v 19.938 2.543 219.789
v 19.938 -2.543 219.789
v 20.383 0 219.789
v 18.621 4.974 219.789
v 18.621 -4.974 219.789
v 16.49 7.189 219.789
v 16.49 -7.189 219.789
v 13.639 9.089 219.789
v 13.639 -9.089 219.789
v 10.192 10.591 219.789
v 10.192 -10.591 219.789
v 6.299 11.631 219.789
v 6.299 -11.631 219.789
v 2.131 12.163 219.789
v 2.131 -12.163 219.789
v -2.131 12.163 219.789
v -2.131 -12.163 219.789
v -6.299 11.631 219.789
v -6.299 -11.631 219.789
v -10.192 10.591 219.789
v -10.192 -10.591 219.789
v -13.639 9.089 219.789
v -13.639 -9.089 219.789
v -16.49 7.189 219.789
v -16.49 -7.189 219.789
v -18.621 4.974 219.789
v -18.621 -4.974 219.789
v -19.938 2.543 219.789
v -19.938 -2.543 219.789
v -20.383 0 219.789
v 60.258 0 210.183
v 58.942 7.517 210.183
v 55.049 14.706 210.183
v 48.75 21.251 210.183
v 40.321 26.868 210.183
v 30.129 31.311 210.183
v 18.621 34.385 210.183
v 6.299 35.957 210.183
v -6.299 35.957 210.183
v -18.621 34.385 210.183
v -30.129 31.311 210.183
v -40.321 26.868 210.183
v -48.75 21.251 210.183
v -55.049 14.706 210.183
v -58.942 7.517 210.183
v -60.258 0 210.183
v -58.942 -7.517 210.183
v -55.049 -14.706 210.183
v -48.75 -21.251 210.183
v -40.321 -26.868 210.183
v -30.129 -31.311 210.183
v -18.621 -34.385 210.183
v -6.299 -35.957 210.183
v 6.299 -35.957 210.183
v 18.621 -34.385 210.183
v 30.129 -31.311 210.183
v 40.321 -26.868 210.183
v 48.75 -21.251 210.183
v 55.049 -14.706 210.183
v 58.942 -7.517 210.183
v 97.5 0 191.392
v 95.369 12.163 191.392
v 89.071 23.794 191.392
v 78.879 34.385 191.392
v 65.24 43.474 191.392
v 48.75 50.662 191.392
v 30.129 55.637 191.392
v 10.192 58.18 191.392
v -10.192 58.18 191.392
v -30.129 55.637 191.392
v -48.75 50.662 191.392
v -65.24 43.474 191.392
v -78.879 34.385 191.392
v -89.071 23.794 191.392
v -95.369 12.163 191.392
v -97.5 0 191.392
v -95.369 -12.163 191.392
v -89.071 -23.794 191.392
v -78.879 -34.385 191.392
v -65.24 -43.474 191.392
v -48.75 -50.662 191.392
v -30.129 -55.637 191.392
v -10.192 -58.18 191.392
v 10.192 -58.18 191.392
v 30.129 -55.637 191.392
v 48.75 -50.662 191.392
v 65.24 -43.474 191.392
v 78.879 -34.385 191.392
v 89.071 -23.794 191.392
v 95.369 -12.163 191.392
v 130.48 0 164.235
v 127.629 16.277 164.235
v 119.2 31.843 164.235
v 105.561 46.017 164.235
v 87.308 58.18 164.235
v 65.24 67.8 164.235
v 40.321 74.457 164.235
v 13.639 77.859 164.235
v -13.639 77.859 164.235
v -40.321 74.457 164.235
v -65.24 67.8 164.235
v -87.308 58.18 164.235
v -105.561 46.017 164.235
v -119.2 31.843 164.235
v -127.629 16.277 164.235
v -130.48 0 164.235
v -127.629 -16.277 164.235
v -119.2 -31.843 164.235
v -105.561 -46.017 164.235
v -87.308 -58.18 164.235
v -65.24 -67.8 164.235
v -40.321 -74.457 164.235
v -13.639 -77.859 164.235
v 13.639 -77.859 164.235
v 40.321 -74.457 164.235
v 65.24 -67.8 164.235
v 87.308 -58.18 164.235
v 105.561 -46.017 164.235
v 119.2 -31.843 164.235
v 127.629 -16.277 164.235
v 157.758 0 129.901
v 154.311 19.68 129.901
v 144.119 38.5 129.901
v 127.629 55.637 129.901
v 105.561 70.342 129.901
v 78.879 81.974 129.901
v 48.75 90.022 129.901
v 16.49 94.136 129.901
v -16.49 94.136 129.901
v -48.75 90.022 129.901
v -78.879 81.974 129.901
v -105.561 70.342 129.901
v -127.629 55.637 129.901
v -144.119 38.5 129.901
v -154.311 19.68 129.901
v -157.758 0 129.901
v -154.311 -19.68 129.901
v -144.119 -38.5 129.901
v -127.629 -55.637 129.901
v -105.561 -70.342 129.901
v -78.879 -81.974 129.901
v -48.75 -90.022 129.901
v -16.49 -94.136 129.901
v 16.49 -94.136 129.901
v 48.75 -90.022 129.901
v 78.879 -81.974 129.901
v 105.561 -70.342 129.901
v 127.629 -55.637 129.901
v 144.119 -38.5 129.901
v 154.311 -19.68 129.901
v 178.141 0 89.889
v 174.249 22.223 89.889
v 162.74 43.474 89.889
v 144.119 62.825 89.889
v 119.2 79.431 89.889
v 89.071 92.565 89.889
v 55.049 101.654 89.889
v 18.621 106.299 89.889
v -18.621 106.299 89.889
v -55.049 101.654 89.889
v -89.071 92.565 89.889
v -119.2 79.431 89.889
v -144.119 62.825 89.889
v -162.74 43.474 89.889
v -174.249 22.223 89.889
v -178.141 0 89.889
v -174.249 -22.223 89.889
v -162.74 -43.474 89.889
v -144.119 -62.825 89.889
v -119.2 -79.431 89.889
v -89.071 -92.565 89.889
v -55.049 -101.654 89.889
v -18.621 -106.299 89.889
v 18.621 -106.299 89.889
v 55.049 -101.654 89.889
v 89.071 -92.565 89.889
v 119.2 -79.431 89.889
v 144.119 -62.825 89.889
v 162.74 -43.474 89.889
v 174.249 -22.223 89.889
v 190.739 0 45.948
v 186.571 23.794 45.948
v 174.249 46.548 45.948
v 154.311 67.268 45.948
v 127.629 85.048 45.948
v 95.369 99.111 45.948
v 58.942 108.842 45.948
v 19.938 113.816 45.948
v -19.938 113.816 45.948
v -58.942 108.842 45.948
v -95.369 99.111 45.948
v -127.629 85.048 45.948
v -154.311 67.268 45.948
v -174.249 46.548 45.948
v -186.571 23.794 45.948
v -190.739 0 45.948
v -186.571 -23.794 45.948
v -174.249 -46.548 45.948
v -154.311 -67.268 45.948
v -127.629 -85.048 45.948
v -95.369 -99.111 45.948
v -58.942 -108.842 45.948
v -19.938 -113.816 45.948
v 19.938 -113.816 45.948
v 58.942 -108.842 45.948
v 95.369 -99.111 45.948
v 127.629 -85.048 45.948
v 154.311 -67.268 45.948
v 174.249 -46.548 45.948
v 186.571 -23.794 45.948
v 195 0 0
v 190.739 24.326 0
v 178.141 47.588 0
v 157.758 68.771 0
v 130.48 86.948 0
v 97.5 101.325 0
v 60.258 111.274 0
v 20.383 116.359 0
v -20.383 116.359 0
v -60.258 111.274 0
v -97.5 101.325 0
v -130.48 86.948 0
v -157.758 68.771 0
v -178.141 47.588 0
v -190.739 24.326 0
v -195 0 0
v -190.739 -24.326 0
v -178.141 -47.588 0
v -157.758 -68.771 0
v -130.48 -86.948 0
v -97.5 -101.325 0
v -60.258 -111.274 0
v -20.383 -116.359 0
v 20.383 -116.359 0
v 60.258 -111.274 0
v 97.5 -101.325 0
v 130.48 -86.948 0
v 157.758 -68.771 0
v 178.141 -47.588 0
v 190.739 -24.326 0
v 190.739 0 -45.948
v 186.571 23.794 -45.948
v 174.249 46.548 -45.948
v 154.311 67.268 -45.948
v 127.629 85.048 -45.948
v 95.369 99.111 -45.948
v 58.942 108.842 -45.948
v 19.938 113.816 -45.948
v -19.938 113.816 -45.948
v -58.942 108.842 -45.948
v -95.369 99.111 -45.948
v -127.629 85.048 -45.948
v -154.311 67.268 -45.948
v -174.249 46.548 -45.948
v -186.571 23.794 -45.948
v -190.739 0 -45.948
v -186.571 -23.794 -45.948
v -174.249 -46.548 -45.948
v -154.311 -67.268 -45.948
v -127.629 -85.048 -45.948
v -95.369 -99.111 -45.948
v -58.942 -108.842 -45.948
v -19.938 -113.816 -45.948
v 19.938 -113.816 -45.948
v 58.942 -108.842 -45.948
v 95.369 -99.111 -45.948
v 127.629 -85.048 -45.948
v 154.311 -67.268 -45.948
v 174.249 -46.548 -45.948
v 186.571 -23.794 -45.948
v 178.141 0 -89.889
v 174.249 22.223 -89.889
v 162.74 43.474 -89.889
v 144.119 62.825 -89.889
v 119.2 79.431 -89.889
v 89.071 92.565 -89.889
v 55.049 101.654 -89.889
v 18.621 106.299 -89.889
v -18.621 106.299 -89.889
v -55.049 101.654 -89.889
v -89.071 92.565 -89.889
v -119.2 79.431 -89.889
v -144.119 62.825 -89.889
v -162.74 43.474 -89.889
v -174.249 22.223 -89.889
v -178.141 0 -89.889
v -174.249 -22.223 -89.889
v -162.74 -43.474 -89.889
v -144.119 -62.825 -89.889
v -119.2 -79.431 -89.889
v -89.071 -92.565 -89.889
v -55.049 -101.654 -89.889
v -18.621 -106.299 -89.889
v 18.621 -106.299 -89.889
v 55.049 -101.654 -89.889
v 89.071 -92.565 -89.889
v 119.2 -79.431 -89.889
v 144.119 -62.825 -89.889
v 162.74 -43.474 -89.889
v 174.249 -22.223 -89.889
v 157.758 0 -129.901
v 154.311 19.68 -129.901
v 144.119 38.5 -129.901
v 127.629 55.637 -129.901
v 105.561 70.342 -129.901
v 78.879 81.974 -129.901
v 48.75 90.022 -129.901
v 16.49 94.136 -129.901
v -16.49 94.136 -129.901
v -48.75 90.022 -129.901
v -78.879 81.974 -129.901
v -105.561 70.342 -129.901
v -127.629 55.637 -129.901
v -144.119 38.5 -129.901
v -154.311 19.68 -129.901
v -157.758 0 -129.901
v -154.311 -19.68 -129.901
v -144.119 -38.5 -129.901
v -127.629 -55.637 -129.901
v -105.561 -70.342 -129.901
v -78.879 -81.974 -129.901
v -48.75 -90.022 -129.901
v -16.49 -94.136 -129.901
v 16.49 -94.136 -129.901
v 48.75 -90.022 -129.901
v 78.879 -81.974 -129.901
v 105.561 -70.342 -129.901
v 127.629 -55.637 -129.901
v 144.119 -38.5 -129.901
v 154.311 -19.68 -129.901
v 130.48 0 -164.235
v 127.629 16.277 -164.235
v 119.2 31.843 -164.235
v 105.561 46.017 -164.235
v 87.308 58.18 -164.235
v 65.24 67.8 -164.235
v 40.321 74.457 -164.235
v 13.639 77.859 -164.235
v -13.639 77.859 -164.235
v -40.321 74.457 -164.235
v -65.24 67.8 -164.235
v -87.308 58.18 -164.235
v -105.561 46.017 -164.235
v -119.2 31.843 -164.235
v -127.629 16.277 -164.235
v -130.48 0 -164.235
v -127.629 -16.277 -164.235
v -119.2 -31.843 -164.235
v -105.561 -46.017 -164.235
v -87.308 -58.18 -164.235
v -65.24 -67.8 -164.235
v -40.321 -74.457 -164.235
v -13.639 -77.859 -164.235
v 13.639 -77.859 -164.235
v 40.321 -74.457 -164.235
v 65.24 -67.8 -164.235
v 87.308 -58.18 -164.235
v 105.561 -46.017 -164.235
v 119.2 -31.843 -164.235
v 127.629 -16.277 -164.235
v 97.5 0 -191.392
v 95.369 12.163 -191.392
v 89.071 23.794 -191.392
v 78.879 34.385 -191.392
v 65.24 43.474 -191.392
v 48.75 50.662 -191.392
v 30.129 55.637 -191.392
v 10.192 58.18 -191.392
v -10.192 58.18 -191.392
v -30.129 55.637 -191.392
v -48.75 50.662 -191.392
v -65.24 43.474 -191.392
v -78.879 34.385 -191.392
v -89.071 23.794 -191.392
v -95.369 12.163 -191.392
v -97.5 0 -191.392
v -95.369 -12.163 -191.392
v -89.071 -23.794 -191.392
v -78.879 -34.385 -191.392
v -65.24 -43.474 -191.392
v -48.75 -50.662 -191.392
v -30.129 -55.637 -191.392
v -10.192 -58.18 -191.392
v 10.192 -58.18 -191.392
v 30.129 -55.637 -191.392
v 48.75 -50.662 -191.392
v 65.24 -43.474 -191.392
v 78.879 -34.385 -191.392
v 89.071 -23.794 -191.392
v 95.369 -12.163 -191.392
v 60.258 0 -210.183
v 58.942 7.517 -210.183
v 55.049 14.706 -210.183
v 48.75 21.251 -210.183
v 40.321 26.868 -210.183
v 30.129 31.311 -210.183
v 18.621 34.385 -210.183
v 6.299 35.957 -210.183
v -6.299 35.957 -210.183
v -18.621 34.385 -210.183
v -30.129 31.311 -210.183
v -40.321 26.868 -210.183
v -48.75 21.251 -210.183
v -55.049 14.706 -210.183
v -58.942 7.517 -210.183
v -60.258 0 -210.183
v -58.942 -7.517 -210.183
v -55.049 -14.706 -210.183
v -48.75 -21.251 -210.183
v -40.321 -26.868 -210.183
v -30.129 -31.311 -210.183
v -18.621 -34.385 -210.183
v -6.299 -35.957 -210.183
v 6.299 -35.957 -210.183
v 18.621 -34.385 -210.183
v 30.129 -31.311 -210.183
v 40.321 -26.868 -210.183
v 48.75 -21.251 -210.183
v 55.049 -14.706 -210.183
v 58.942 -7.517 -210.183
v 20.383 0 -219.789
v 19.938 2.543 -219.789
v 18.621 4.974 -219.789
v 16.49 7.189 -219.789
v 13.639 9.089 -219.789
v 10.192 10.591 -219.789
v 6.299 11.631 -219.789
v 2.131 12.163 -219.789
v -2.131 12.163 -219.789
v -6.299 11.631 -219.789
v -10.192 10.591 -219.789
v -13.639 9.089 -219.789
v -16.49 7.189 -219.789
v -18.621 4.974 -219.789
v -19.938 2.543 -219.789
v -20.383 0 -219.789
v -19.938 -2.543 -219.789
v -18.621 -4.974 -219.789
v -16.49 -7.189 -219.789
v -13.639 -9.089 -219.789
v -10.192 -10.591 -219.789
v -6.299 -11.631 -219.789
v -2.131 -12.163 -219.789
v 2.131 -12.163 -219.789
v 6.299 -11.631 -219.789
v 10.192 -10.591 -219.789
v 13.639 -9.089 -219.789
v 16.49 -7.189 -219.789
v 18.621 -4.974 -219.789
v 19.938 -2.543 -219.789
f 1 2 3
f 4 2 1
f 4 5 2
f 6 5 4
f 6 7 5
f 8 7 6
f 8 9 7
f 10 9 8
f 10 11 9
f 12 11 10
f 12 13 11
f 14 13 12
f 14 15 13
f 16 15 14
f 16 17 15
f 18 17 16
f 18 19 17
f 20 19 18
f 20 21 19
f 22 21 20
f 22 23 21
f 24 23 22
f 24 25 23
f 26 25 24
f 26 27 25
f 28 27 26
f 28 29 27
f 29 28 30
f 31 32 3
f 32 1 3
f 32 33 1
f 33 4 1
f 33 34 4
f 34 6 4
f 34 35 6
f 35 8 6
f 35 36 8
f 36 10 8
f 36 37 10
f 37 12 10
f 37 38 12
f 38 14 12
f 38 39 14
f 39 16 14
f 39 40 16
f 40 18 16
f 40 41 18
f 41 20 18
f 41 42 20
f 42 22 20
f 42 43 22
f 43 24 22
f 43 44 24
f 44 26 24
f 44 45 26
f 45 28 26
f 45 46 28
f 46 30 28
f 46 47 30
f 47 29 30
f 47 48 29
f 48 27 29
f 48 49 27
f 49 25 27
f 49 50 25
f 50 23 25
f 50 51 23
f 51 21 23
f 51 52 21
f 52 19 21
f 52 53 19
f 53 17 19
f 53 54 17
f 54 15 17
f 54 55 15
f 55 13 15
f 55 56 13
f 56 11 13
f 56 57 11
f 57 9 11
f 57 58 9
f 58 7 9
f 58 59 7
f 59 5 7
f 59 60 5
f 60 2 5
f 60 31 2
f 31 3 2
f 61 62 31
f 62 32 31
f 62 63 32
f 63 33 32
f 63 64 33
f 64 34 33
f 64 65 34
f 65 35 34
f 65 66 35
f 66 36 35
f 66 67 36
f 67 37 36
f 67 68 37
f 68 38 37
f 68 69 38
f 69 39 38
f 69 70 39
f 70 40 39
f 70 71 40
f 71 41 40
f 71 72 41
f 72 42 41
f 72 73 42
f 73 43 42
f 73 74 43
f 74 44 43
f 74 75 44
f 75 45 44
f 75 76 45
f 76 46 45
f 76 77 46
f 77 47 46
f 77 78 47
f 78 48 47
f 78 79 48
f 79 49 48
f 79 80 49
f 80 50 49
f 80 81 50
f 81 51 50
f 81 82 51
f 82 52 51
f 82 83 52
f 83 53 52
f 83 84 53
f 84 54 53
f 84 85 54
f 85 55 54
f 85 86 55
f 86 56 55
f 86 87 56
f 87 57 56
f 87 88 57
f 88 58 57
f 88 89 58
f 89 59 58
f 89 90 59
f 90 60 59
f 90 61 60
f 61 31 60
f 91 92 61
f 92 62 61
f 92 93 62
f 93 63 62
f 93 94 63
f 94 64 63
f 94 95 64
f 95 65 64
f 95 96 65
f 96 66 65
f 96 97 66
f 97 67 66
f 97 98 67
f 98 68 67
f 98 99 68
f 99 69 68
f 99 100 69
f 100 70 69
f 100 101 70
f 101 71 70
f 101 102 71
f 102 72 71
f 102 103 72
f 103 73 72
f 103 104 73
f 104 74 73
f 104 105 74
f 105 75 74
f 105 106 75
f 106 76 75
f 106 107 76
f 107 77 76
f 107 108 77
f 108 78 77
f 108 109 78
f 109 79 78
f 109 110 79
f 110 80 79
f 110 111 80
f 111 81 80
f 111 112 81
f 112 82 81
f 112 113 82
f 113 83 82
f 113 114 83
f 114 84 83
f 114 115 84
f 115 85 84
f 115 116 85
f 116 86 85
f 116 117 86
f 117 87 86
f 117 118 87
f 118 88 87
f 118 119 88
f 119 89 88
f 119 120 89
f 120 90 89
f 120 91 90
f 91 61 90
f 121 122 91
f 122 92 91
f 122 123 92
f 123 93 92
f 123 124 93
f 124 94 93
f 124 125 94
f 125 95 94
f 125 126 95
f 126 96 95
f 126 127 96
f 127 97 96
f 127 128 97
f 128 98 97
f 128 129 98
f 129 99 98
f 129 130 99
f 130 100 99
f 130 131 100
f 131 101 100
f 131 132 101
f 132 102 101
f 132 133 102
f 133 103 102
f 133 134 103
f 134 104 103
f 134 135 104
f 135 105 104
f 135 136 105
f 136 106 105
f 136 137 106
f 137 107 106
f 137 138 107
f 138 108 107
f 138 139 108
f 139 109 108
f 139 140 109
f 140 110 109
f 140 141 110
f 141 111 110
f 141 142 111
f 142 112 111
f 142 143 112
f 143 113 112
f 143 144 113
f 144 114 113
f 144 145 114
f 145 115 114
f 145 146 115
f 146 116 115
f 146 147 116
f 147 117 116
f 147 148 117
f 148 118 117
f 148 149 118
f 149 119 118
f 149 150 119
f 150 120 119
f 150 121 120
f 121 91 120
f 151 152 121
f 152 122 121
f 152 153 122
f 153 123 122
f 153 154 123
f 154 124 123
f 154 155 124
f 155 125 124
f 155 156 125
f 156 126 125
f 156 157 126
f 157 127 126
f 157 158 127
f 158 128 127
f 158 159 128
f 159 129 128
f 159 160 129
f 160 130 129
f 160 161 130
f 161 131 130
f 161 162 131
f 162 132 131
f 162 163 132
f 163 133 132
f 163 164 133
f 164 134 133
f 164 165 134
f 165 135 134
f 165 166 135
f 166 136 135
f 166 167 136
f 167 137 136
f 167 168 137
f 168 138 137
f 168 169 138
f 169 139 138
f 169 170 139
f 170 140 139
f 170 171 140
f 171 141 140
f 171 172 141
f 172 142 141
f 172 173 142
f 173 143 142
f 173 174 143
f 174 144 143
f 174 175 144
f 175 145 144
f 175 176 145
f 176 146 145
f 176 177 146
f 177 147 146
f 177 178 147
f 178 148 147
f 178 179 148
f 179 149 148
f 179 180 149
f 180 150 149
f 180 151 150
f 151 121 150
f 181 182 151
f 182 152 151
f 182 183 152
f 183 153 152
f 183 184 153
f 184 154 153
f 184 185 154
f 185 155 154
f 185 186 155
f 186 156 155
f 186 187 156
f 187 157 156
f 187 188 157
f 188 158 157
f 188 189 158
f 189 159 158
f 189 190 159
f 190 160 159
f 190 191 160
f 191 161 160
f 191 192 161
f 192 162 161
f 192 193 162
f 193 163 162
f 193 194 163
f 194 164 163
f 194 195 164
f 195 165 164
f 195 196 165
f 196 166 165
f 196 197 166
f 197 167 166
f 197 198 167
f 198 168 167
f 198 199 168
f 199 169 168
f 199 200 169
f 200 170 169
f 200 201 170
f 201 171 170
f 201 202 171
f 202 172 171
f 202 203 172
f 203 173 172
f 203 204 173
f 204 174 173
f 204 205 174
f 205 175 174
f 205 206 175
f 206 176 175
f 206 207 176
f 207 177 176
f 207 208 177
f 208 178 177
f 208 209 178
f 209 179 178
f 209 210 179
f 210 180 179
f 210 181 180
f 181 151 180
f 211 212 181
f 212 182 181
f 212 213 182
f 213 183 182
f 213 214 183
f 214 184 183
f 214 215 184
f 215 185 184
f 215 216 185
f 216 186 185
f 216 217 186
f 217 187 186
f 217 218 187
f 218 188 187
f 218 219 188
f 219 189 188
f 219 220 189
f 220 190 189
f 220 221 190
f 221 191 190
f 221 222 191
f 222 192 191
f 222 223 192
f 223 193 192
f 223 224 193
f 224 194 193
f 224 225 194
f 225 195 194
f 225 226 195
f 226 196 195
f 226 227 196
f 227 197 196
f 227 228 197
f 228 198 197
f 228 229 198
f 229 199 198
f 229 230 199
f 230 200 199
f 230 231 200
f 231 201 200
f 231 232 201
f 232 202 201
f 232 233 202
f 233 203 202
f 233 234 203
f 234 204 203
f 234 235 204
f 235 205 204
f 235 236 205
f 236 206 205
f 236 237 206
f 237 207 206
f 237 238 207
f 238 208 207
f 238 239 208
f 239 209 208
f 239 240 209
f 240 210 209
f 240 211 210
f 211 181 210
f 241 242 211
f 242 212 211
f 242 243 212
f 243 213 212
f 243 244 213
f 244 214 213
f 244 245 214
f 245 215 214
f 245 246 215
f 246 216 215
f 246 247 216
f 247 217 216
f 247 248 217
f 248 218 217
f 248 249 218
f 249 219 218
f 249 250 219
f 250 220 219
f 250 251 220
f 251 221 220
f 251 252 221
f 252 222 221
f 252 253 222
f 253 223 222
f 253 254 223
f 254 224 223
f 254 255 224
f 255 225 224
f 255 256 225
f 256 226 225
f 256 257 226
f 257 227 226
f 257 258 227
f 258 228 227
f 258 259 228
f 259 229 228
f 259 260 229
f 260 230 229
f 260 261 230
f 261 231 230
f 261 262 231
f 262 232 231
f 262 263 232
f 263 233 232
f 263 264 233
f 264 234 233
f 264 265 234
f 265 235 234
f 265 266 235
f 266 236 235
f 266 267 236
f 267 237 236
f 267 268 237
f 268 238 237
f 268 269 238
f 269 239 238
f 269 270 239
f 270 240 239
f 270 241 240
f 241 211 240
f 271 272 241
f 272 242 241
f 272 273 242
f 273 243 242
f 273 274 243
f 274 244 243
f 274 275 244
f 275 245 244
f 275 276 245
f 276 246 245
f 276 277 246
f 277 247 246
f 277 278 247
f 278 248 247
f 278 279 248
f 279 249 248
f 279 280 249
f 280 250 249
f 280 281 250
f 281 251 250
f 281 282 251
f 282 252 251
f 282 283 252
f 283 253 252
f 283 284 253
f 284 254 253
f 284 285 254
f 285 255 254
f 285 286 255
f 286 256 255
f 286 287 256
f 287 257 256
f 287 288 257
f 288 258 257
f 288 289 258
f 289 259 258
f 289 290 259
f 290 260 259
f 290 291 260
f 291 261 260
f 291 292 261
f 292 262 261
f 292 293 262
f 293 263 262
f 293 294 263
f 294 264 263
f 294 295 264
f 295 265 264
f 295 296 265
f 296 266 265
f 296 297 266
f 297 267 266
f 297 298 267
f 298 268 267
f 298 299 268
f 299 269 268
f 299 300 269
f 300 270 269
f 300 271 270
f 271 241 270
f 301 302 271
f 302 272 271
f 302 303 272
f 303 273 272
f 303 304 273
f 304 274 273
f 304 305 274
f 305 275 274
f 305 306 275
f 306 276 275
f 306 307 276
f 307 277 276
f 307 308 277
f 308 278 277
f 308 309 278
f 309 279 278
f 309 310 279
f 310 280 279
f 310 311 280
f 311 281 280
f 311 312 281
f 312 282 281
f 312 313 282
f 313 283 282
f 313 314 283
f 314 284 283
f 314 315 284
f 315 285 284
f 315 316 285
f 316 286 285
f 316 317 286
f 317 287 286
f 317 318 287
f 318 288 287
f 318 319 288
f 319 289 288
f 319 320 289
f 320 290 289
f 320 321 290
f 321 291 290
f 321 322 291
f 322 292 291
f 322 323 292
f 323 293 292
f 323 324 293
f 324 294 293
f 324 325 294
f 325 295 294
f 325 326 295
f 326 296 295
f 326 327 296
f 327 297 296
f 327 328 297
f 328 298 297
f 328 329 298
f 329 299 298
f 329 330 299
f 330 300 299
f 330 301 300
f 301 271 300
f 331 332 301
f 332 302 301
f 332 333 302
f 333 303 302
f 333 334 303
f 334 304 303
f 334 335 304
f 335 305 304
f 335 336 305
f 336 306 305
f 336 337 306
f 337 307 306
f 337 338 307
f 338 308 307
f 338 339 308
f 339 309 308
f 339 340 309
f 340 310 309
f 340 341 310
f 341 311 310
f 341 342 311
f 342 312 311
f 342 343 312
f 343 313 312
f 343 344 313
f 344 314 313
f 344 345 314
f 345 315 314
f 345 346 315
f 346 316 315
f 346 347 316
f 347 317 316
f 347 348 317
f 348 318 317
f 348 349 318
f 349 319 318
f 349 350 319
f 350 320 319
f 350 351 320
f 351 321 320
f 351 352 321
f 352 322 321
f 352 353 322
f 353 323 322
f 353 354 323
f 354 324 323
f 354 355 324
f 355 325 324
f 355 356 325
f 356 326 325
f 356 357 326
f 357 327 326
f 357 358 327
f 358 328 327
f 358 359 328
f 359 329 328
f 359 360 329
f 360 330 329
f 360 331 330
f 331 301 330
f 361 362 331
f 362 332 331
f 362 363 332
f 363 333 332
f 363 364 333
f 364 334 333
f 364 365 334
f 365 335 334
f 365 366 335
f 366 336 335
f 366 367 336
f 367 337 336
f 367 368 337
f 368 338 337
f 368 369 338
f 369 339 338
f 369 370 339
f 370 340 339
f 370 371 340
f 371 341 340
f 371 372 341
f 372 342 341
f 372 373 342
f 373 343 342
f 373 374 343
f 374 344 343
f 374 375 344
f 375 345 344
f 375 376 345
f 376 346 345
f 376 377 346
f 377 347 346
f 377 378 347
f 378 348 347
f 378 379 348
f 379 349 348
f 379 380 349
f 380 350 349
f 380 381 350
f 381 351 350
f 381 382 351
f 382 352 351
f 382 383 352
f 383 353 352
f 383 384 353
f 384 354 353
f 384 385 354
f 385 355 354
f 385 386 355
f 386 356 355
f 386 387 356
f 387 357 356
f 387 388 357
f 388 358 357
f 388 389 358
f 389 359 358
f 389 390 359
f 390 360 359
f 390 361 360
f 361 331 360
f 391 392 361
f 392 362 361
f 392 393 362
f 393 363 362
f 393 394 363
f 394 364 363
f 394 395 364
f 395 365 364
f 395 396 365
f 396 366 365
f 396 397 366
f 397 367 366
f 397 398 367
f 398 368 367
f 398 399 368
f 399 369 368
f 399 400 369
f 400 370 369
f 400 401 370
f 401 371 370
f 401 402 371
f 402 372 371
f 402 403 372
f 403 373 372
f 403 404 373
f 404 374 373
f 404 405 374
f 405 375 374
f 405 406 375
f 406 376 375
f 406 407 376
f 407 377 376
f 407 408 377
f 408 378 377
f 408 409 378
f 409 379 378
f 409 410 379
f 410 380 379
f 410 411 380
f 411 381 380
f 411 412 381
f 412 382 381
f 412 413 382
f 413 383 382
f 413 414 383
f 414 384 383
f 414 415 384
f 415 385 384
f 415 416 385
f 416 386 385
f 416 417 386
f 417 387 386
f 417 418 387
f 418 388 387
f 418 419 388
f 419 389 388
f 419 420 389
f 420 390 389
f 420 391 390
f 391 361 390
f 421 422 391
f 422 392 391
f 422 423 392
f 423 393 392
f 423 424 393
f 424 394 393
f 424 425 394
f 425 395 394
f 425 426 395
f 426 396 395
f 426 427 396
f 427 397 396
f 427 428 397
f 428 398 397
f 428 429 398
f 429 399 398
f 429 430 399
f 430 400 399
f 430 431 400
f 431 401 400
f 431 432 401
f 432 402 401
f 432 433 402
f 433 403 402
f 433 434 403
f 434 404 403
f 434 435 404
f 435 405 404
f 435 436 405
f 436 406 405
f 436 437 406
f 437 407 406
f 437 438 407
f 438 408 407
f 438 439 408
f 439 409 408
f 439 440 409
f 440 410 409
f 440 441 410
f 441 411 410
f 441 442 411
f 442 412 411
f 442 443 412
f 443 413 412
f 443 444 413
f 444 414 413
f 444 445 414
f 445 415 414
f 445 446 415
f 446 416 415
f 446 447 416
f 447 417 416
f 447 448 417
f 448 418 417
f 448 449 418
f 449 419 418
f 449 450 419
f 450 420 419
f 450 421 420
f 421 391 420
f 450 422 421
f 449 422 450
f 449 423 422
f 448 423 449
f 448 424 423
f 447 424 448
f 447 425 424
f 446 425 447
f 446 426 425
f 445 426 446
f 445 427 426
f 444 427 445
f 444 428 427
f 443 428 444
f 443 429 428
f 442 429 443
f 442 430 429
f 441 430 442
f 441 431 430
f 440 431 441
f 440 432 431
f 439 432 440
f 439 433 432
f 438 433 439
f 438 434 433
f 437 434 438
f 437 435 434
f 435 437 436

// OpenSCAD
// Generated by SolidPython 1.0.1 on 2020-07-29 00:46:52


scale(v = [15, 9, 17]) {
	sphere(r = 13);
}
/***********************************************
*********      SolidPython code:      **********
************************************************
 
# import packages: SolidPython
from solid import *
from solid.utils import *
from itertools import chain, combinations, permutations


class Resize:

    def __init__(self, scad_file):
        self.scad_file = scad_file
        #self.scad_file = import_scad(scad_file)
        # cone/cylinder param:
        self.r1 = 0
        self.r2 = 0
        self.h = 0
        # rectangular prism param:
        self.w = 0
        self.l = 0
        # ellipse param:
        self.r = 0

    # import OpenScad code (file name corresponds to shape)


    # classify shape + parameters
    def assign(self, param1, param2, param3):
        if self.scad_file == 'cone.scad':
            self.r1 = param1
            self.r2 = param2
            self.h = param3
        elif self.scad_file == 'cylinder.scad':
            self.r1 = param1
            self.r2 = param2
            self.h = param3
        elif self.scad_file == 'rectangularPrism.scad':
            self.h = param1
            self.l = param2
            self.w = param3
        else:
            self.r = param1
            self.h = param2

    # resize parameters
    def iterate(self):
        x = range(3, 20, 2)
        i = 1
        if self.scad_file == 'cone.scad':
            tempList = list(permutations(x, 2))
            for temp in tempList:
                param1 = temp[0]
                param2 = temp[1]
                filepath = 'produced_scad_files/' + 'cone' + str(param1) + '_' + str(param2) + '_' + '.scad'
                scad_render_to_file(cylinder(h=param1, r1=param2, r2=0), filepath)

        elif self.scad_file == 'cylinder.scad':
            tempList = list(permutations(x, 3))
            for temp in tempList:
                param1 = temp[0]
                param2 = temp[1]
                filepath = 'produced_scad_files/' + 'cylinder' + str(param1) + '_' + str(param2) + '_' + '.scad'
                scad_render_to_file(cylinder(h=param1, r1=param2, r2=param2), filepath)

        elif self.scad_file == 'rectangularPrism.scad':
            tempList = list(permutations(x, 3))
            for temp in tempList:
                param1 = temp[0]
                param2 = temp[1]
                param3 = temp[2]
                filepath = 'produced_scad_files/' + 'rectangularPrism' + str(param1) + '_' + str(param2) + '_' + str(
                    param3) + '.scad'
                scad_render_to_file(cube(size=(param1, param2, param3)), filepath)

        elif self.scad_file == 'ellipse.scad':
            tempList = list(permutations(x, 4))
            for temp in tempList:
                param1 = temp[0]
                param2 = temp[1]
                param3 = temp[2]
                param4 = temp[3]
                filepath = 'produced_scad_files/' + 'ellipse' + str(param1) + '_' + str(param2) + '_' + str(param3) + '_' + str(param4) + '.scad'
                scad_render_to_file(scale([param1, param2, param3])(sphere(r=param4)), filepath)

    def render_to_scadfile(self):
        scad_render_to_file(scad, 'example.scad') 
 
************************************************/
